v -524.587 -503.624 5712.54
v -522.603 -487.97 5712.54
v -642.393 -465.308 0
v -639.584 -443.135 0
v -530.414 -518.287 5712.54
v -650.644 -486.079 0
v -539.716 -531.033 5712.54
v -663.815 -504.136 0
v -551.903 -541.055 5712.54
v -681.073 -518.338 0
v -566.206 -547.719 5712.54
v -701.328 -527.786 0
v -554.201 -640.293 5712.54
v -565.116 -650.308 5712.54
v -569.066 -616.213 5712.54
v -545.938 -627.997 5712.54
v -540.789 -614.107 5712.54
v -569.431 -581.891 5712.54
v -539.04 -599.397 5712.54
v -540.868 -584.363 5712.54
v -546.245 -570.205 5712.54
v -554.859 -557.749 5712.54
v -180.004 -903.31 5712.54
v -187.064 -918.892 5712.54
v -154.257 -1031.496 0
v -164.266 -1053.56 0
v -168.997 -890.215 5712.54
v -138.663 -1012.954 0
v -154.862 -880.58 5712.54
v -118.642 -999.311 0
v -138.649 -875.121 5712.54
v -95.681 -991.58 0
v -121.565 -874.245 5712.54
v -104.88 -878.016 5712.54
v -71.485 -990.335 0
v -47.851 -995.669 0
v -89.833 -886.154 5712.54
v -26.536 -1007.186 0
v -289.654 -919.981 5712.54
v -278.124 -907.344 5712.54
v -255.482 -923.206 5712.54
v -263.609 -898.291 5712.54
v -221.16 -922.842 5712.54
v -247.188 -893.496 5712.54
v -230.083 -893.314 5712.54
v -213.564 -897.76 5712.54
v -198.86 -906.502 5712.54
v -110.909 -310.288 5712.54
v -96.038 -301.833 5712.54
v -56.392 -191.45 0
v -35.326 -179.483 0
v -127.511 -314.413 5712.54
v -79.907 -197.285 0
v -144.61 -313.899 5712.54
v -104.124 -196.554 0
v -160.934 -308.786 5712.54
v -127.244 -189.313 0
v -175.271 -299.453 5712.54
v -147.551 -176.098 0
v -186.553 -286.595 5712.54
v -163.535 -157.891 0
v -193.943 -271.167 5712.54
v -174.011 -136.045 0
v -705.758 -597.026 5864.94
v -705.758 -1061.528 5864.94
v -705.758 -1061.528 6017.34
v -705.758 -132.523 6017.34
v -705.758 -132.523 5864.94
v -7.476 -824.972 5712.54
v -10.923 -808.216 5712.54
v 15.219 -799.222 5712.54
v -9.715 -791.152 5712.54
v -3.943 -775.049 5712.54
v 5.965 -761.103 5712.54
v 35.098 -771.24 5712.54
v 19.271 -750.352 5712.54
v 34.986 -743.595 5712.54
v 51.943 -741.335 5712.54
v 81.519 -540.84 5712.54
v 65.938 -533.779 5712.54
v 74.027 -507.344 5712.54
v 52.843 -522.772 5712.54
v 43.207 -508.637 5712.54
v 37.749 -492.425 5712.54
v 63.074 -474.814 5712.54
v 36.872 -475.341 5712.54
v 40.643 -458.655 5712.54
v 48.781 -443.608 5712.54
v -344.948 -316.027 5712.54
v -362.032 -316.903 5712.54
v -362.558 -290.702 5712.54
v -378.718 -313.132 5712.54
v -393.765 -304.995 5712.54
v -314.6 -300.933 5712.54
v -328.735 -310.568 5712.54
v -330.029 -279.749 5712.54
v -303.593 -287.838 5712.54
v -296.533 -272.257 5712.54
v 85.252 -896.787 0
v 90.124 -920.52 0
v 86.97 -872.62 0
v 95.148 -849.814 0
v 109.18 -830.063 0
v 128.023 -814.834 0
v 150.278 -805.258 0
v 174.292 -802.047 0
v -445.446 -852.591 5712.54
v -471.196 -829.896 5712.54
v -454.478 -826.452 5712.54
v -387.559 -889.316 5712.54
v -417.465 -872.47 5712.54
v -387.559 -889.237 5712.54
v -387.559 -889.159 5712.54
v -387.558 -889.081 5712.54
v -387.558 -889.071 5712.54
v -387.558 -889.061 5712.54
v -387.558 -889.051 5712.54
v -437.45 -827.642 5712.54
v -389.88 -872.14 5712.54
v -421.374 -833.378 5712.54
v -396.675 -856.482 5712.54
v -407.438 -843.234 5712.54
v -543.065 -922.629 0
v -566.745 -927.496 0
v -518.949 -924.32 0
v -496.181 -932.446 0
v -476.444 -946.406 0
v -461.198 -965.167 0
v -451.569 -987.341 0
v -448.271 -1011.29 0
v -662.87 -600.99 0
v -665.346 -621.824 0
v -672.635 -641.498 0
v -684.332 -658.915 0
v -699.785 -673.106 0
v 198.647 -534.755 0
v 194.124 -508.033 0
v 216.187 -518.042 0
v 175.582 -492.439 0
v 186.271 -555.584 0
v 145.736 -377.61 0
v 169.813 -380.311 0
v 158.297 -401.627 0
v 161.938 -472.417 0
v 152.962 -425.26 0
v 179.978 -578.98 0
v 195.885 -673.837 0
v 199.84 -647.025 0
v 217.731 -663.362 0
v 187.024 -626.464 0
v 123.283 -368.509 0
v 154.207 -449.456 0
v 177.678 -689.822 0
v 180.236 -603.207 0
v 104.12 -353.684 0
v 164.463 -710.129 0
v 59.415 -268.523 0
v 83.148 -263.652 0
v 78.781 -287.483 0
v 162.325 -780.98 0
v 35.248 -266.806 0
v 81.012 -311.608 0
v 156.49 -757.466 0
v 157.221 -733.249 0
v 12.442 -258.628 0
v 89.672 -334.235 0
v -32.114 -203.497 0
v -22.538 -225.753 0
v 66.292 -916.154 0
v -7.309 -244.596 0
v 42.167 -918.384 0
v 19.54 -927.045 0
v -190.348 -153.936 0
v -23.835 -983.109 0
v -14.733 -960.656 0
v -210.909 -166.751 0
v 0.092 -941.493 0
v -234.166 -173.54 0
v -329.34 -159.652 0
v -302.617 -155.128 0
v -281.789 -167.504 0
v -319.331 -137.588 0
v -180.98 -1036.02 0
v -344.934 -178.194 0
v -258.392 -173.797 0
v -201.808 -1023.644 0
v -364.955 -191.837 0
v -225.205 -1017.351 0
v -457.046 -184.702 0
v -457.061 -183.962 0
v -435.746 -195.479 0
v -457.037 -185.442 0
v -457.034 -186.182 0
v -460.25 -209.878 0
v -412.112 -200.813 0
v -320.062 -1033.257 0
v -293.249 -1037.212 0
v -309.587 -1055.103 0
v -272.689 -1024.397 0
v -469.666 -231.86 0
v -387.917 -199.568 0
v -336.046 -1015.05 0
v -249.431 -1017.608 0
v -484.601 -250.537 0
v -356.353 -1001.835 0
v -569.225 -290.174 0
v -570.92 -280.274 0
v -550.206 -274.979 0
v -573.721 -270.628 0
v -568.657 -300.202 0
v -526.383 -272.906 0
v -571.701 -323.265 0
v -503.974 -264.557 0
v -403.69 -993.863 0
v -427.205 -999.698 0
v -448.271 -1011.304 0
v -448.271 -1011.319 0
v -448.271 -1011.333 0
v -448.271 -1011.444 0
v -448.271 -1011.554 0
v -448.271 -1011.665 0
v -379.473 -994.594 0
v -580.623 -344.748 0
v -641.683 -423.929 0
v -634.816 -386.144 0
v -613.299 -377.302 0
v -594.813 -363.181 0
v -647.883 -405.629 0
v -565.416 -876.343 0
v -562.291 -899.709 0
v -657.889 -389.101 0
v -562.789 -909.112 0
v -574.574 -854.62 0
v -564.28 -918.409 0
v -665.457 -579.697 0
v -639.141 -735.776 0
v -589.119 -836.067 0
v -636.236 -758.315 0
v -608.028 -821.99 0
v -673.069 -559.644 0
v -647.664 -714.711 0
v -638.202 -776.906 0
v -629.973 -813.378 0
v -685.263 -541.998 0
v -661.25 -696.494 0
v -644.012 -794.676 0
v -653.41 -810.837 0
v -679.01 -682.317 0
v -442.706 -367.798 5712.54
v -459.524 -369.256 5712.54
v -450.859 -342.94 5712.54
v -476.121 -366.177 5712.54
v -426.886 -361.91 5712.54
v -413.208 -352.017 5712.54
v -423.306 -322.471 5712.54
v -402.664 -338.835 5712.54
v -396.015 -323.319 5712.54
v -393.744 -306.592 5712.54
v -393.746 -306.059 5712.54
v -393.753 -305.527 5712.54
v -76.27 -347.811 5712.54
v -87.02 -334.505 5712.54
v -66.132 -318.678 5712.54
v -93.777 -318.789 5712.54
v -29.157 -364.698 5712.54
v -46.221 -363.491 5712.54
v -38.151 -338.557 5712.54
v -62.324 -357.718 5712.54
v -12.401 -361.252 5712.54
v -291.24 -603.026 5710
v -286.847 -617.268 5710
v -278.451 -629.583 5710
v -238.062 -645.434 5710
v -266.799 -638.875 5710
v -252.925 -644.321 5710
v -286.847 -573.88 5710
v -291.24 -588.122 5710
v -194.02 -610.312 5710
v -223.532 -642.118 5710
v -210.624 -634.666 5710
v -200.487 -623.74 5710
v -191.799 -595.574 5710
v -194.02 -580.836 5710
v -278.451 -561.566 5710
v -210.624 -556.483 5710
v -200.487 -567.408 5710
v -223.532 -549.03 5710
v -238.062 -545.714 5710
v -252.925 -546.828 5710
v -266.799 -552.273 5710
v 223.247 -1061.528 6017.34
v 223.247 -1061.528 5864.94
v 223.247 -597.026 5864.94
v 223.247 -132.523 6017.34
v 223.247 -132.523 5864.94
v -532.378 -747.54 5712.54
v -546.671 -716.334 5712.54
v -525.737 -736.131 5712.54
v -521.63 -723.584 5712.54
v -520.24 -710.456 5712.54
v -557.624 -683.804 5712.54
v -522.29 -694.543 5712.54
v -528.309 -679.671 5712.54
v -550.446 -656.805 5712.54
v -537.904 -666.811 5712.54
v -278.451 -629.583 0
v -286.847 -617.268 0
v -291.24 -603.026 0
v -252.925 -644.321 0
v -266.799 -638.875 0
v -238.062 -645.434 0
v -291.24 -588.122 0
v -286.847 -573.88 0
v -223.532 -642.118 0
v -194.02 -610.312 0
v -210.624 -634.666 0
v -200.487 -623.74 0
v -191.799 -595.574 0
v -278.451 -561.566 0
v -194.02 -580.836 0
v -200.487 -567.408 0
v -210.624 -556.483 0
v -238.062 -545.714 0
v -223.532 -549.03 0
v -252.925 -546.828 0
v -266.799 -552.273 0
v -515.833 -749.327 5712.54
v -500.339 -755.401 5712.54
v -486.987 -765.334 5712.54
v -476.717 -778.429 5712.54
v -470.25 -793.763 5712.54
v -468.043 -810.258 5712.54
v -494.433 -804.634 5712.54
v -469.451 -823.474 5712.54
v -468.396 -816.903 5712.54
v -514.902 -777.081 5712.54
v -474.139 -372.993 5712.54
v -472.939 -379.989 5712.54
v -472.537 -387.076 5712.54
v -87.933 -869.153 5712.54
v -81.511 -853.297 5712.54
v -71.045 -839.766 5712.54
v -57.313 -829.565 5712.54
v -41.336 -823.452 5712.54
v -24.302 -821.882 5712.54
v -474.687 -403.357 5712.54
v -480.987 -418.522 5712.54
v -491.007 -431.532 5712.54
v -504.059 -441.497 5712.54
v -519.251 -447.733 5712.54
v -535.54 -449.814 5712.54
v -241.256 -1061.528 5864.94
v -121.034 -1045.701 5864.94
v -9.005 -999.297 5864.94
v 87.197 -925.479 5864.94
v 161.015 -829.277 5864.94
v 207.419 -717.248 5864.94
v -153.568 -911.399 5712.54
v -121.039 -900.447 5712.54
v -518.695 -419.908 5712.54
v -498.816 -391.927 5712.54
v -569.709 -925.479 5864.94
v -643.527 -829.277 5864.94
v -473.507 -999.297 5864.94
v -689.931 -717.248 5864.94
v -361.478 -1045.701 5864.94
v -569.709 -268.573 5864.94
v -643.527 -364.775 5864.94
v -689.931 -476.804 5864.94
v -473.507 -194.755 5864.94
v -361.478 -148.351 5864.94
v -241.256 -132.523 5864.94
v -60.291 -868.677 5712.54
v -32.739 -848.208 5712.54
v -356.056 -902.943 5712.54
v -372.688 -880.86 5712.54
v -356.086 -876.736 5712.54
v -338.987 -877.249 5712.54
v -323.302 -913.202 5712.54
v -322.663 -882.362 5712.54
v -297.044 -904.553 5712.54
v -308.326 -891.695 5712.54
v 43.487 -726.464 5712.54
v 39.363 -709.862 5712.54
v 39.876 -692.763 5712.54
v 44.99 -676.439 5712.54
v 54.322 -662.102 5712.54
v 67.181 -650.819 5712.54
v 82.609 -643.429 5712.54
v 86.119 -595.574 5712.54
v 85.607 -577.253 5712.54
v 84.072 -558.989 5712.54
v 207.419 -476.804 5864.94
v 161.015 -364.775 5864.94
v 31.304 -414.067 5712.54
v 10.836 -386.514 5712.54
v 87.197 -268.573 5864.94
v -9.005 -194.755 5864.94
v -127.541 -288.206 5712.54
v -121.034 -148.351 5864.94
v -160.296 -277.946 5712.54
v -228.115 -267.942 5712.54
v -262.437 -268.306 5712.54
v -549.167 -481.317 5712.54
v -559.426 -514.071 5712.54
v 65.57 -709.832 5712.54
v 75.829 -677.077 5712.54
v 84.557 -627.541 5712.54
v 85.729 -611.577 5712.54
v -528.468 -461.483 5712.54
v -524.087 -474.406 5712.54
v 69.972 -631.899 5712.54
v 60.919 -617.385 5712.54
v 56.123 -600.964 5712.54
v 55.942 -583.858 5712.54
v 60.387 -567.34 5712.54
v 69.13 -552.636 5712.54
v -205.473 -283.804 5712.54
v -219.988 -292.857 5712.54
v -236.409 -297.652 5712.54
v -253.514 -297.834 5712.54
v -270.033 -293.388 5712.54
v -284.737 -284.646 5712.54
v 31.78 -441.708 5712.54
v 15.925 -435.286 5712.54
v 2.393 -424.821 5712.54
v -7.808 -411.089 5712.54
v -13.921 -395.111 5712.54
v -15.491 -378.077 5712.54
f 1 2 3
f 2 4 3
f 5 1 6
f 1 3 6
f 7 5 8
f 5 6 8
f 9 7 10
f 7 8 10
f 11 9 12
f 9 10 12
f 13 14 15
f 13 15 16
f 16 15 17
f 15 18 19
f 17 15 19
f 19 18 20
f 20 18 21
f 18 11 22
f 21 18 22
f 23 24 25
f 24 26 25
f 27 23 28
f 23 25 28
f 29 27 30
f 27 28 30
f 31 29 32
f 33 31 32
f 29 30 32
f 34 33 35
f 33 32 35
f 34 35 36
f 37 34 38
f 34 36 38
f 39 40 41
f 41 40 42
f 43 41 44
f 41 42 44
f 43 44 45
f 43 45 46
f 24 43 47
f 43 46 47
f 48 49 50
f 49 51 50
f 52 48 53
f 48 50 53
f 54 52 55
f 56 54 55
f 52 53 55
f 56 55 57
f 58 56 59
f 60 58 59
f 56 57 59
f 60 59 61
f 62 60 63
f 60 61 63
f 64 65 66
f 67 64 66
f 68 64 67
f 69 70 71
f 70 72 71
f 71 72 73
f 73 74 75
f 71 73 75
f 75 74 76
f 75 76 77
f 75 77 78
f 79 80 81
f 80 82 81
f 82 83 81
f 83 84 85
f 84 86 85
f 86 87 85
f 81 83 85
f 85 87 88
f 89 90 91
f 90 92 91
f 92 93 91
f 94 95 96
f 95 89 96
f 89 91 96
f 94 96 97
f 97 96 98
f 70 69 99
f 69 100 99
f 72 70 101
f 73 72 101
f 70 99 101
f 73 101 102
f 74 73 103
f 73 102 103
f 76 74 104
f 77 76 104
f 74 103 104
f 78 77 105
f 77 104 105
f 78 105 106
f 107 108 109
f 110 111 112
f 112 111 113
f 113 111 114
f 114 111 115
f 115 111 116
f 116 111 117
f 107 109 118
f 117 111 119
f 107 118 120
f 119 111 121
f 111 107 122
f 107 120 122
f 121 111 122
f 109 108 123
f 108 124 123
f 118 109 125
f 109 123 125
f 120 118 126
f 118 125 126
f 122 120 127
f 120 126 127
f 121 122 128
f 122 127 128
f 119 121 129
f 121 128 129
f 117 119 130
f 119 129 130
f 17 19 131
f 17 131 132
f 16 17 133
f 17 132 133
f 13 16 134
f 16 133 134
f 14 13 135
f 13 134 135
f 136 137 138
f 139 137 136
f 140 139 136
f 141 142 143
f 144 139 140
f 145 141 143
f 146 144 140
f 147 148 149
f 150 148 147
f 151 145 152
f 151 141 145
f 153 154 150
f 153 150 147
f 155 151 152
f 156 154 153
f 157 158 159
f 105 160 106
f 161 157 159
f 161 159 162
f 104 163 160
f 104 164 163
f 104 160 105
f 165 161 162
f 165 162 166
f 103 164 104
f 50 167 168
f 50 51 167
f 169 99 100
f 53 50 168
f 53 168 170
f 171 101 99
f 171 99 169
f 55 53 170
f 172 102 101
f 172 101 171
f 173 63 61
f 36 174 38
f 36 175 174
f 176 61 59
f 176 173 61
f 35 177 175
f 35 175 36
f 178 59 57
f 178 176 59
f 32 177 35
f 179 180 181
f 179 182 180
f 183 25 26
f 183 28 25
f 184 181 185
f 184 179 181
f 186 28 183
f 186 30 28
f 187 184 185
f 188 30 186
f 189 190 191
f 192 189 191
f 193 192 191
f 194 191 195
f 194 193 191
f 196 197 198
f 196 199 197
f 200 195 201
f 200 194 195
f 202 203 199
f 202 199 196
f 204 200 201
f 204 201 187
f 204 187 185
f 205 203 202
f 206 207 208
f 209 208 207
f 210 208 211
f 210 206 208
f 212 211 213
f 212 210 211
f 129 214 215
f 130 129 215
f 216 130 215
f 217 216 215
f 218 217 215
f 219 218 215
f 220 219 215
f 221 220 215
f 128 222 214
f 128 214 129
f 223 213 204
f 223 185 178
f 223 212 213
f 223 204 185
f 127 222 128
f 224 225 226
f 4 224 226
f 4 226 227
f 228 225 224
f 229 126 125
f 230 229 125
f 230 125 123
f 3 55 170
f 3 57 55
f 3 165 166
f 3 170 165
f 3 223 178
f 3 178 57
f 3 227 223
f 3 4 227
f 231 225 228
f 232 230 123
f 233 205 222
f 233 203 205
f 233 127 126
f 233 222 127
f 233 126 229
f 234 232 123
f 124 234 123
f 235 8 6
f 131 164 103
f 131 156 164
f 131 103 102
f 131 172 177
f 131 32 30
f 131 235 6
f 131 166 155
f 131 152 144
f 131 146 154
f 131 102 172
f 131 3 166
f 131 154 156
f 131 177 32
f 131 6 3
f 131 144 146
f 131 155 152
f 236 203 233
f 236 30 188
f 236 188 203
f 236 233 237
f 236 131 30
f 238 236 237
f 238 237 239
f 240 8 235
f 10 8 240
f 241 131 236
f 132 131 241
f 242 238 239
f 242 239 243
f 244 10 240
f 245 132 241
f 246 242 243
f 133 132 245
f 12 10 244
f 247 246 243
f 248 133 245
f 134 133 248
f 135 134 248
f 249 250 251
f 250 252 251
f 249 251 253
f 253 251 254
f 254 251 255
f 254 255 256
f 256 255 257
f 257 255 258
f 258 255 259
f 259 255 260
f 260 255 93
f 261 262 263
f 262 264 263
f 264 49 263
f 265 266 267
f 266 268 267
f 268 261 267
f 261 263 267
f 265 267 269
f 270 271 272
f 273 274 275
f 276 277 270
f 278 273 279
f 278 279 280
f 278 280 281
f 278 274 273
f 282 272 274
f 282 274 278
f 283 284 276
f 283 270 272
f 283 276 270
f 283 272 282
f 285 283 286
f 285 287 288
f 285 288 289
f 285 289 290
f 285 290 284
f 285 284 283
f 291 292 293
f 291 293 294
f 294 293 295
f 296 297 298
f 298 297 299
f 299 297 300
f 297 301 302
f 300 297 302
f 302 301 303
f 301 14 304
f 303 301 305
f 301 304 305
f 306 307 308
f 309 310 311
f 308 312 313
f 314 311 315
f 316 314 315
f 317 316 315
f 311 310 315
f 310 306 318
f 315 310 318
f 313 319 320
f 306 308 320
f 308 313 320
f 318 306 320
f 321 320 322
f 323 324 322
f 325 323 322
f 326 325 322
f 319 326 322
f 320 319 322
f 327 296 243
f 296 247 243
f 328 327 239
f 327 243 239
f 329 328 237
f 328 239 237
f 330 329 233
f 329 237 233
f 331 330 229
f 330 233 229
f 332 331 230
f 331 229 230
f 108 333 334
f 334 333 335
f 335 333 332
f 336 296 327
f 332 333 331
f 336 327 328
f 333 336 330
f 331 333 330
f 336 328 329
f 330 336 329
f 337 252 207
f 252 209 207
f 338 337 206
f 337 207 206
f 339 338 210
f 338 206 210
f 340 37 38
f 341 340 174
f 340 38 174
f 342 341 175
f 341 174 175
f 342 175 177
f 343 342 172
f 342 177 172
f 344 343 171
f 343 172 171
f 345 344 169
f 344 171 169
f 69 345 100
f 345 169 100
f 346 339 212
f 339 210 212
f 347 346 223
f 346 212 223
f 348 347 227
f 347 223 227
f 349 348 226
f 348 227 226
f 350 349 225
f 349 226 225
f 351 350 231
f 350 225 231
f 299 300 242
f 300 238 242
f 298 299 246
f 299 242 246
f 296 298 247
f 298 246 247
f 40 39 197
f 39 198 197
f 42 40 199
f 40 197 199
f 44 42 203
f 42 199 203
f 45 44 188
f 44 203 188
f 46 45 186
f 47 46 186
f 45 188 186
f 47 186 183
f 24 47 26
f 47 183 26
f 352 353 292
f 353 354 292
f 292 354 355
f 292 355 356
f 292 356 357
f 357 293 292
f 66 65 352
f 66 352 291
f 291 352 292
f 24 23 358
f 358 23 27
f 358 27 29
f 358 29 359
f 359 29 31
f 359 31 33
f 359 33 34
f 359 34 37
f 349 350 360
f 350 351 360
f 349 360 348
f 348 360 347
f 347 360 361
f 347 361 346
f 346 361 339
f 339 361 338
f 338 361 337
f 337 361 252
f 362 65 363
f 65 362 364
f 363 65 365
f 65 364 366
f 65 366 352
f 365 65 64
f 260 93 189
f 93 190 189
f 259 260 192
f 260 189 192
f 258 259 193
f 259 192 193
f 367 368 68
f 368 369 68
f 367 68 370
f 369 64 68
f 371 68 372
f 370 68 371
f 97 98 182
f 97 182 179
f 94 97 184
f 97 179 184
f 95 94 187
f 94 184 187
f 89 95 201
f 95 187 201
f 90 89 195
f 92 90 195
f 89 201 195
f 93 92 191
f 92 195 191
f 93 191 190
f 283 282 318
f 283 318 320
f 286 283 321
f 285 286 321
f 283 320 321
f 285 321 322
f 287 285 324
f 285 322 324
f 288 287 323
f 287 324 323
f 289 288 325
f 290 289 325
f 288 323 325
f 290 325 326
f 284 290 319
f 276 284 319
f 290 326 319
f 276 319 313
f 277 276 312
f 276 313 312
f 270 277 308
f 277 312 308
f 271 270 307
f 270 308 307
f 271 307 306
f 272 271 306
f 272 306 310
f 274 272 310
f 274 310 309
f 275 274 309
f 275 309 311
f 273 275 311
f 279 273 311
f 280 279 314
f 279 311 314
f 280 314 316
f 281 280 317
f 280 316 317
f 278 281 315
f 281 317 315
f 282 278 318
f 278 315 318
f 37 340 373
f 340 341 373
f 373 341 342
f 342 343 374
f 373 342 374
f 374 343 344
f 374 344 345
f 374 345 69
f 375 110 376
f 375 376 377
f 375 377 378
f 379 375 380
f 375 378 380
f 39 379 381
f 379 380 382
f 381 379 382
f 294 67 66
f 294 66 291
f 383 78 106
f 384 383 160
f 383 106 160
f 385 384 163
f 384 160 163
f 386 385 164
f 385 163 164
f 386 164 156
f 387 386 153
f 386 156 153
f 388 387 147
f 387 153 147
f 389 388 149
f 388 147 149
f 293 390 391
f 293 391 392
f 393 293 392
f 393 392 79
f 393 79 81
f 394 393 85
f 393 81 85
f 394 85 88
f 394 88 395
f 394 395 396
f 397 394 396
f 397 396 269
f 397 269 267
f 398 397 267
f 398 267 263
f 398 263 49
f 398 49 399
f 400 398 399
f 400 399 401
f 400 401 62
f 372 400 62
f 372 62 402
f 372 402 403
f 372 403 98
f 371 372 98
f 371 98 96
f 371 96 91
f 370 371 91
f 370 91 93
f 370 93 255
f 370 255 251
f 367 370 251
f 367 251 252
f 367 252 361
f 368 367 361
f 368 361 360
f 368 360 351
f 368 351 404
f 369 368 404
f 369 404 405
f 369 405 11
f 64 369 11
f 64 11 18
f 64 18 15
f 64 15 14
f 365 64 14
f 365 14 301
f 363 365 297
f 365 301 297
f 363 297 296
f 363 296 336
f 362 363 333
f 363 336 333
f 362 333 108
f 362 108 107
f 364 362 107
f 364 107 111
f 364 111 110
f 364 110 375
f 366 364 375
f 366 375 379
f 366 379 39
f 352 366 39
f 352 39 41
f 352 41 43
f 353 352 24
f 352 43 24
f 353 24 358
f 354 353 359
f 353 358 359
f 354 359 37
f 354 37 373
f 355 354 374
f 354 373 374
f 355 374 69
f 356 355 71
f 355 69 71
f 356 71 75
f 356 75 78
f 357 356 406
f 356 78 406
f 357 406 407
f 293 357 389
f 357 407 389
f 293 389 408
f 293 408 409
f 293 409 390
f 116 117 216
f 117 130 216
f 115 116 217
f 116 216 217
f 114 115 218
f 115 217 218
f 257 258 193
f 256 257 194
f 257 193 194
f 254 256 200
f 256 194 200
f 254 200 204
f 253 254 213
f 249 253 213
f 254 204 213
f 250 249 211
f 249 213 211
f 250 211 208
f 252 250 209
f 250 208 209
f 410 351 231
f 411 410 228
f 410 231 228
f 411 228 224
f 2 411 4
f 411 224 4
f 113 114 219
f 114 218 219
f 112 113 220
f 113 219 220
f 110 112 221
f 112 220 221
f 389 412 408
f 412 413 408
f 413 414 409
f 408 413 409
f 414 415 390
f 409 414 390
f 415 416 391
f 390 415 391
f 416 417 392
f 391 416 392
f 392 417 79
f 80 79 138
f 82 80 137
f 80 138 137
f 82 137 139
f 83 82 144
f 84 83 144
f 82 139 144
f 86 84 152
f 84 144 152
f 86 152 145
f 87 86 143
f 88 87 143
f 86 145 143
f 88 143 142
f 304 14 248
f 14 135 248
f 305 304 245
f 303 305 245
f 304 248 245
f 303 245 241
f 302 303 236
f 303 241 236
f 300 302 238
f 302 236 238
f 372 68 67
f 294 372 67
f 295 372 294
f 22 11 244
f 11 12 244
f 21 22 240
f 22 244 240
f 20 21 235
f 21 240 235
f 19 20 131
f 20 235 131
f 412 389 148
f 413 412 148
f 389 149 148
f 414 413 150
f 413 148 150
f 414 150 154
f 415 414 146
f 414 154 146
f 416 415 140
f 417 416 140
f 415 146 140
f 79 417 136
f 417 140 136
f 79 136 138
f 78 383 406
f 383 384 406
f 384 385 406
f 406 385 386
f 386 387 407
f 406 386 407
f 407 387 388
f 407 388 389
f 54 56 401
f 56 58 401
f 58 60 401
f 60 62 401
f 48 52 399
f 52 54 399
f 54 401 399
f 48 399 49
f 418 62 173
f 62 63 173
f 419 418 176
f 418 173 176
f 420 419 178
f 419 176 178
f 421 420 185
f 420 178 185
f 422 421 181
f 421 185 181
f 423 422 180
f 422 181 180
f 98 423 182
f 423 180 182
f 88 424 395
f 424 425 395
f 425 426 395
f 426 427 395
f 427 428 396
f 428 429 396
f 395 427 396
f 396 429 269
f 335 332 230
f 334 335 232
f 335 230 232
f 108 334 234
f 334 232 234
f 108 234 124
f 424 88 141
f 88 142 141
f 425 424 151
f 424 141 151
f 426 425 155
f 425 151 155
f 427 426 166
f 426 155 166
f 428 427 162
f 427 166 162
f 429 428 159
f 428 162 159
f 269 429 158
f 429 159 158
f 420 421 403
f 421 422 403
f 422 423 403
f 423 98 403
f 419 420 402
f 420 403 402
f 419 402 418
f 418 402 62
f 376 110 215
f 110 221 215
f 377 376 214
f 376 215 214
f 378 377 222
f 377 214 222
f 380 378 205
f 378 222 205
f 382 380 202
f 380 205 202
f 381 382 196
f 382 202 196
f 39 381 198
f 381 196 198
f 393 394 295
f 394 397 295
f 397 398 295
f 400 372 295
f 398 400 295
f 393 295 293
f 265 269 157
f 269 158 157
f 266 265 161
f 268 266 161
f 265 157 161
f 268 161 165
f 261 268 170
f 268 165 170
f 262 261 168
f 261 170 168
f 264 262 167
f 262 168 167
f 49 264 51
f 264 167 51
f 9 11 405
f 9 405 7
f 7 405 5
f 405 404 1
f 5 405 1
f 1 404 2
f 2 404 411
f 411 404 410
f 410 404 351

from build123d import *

# Parameters (mm, degrees)
F1_R      = 50
F2_DEPTH  = 5710
F8_R      = 464.5025
F6_R      = 327.9178677151
F10_W     = 929.005
F10_H     = 929.005
F11_DEPTH = 152.4


with BuildPart() as f2:
    # F1 (on face) → F2 (new body)
    with BuildSketch(Plane.XY):
        with Locations((-241.7985647917, -595.5741405487)):
            Circle(F1_R)
    extrude(amount=F2_DEPTH)


with BuildPart() as f5:
    # F4 (on offset) → F5 section 0
    with BuildSketch(Plane.XY.offset(5712.54)):
        with BuildLine():
            ThreePointArc((82.6085809515, -643.4294616488), (55.4466731348, -592.4173741574), (81.5190725913, -540.8399343891))
            ThreePointArc((81.5190725913, -540.8399343891), (39.9229612138, -500.7180472855), (48.7809811976, -443.6081725838))
            ThreePointArc((48.7809811976, -443.6081725838), (-3.1776165419, -418.3038957235), (-12.4010607443, -361.2518985322))
            ThreePointArc((-12.4010607443, -361.2518985322), (-69.6360752822, -353.2421908394), (-96.0381286887, -301.8327181482))
            ThreePointArc((-96.0381286887, -301.8327181482), (-152.9469980223, -311.9016256189), (-193.9432436916, -271.1669948055))
            ThreePointArc((-193.9432436916, -271.1669948055), (-244.955331183, -298.3289026223), (-296.5327709513, -272.2565031657))
            ThreePointArc((-296.5327709513, -272.2565031657), (-336.6546580548, -313.8526145432), (-393.7645327565, -304.9945945594))
            ThreePointArc((-393.7645327565, -304.9945945594), (-393.7492868459, -305.7930100504), (-393.7442046012, -306.5915549174))
            ThreePointArc((-393.7442046012, -306.5915549174), (-419.7128558258, -357.4253196278), (-476.1208068082, -366.1766365013))
            ThreePointArc((-476.1208068082, -366.1766365013), (-473.4397179136, -376.4739586196), (-472.537369413, -387.0762625037))
            ThreePointArc((-472.537369413, -387.0762625037), (-491.0065595478, -431.5321858111), (-535.5399871922, -449.8137044457))
            ThreePointArc((-535.5399871922, -449.8137044457), (-525.9251935326, -467.8251960906), (-522.6029798153, -487.9701950831))
            ThreePointArc((-522.6029798153, -487.9701950831), (-534.6627538789, -524.953624615), (-566.2057105349, -547.7188194486))
            ThreePointArc((-566.2057105349, -547.7188194486), (-546.2453578162, -570.2054941972), (-539.0402650343, -599.3971515655))
            ThreePointArc((-539.0402650343, -599.3971515655), (-545.9384891407, -627.9974325458), (-565.1162021747, -650.3083467084))
            ThreePointArc((-565.1162021747, -650.3083467083), (-532.6956053929, -672.930364835), (-520.2402290675, -710.449885093))
            ThreePointArc((-520.2402290675, -710.449885093), (-523.3518638208, -729.9627836852), (-532.378110781, -747.5401085136))
            ThreePointArc((-532.378110781, -747.5401085136), (-486.9869353651, -765.3342523192), (-468.0431504229, -810.2577803582))
            ThreePointArc((-468.0431504229, -810.2577803582), (-468.8363948241, -820.2028242393), (-471.1960688391, -829.8963825652))
            ThreePointArc((-471.1960688391, -829.8963825652), (-414.0689953151, -837.8295757031), (-387.5584428367, -889.05094517))
            ThreePointArc((-387.5584428367, -889.05094517), (-387.5585823513, -889.1832543539), (-387.5590008947, -889.3155629493))
            ThreePointArc((-387.5590008947, -889.3155629493), (-330.6501315611, -879.2466554785), (-289.6538858918, -919.9812862919))
            ThreePointArc((-289.6538858918, -919.9812862919), (-238.6417984004, -892.8193784752), (-187.064358632, -918.8917779317))
            ThreePointArc((-187.064358632, -918.8917779317), (-146.9424715285, -877.2956665542), (-89.8325968268, -886.153686538))
            ThreePointArc((-89.8325968268, -886.153686538), (-64.5283199665, -834.1950887985), (-7.4763227751, -824.9716445961))
            ThreePointArc((-7.4763227751, -824.9716445961), (0.5333849176, -767.7366300582), (51.9428576089, -741.3345766517))
            ThreePointArc((51.9428576089, -741.3345766517), (41.8739501382, -684.4257073181), (82.6085809515, -643.4294616488))
        make_face()
    # F0 (on Top) → F5 section 1
    with BuildSketch(Plane.XY):
        with BuildLine():
            ThreePointArc((217.7307352444, -663.3621136576), (179.277690131, -591.1022200019), (216.1874245599, -518.0419680587))
            ThreePointArc((216.1874245599, -518.0419680587), (157.2868702821, -461.2013697562), (169.8132542617, -380.3112058671))
            ThreePointArc((169.8132542617, -380.3112058671), (96.2307874564, -344.4538567113), (83.1476512463, -263.6518737126))
            ThreePointArc((83.1476512463, -263.6518737126), (2.0860364438, -252.2877408718), (-35.3259514283, -179.4833998399))
            ThreePointArc((-35.3259514283, -179.4833998399), (-115.9318385818, -193.7248838151), (-174.0105320782, -136.044780908))
            ThreePointArc((-174.0105320782, -136.044780908), (-246.2704257338, -174.4978260214), (-319.330677677, -137.5880915925))
            ThreePointArc((-319.330677677, -137.5880915925), (-376.1712759795, -196.4886458703), (-457.0614398687, -183.9622618907))
            ThreePointArc((-457.0614398687, -183.9622618907), (-457.0406511287, -185.0720867353), (-457.0337211885, -186.1820846331))
            ThreePointArc((-457.0337211885, -186.1820846331), (-493.8139496004, -258.2011057983), (-573.7207720232, -270.6278649061))
            ThreePointArc((-573.7207720232, -270.6278649061), (-569.932364408, -285.1998152046), (-568.6573713385, -300.2020870469))
            ThreePointArc((-568.6573713385, -300.2020870469), (-594.8130235777, -363.1811059665), (-657.8892458958, -389.1014675807))
            ThreePointArc((-657.8892458958, -389.1014675807), (-644.284327422, -414.6100181367), (-639.5836527418, -443.1351582011))
            ThreePointArc((-639.5836527418, -443.1351582011), (-656.6597028867, -495.5234224139), (-701.3278648277, -527.7860482305))
            ThreePointArc((-701.3278648278, -527.7860482305), (-673.0694299239, -559.6443885492), (-662.8698068021, -600.9900132178))
            ThreePointArc((-662.8698068021, -600.9900132178), (-672.6347988683, -641.4975497921), (-699.7845541433, -673.1061938294))
            ThreePointArc((-699.7845541433, -673.1061938294), (-653.8728585496, -705.1666762733), (-636.2364225158, -758.3147190485))
            ThreePointArc((-636.2364225158, -758.3147190485), (-640.6389230326, -785.9440979971), (-653.410383845, -810.8369560211))
            ThreePointArc((-653.410383845, -810.8369560211), (-589.1185555035, -836.0674576604), (-562.2905611026, -899.7092373409))
            ThreePointArc((-562.2905611026, -899.7092373409), (-563.4111789384, -913.7801316574), (-566.7447808297, -927.4962881755))
            ThreePointArc((-566.7447808297, -927.4962881755), (-485.8185302397, -938.7644427359), (-448.2705586888, -1011.3328874909))
            ThreePointArc((-448.2705586888, -1011.3328874909), (-448.2707135555, -1011.4988250586), (-448.2711781551, -1011.6647620482))
            ThreePointArc((-448.2711781551, -1011.6647620482), (-367.6652910016, -997.423278073), (-309.5865975052, -1055.1033809801))
            ThreePointArc((-309.5865975052, -1055.1033809801), (-237.3267038496, -1016.6503358667), (-164.2664519063, -1053.5600702956))
            ThreePointArc((-164.2664519063, -1053.5600702956), (-107.4258536038, -994.6595160178), (-26.5356897147, -1007.1858999974))
            ThreePointArc((-26.5356897147, -1007.1858999974), (9.3216594411, -933.6034331922), (90.1236424398, -920.520296982))
            ThreePointArc((90.1236424398, -920.520296982), (101.4877752806, -839.4586821795), (174.2921163125, -802.0466943075))
            ThreePointArc((174.2921163125, -802.0466943075), (160.0506323373, -721.440807154), (217.7307352444, -663.3621136576))
        make_face()
    loft()

    # F8 (on offset) → F9 section 0
    with BuildSketch(Plane.XY.offset(5864.94)):
        with Locations((-241.2558197975, -597.0259308815)):
            Circle(F8_R)
    # F6 (on offset) → F9 section 1
    with BuildSketch(Plane.XY.offset(5712.54)):
        with Locations((-241.7985647917, -595.5741405487)):
            Circle(F6_R)
    loft()

    # F10 (on offset) → F11 (join)
    with BuildSketch(Plane.XY.offset(5864.94)):
        with Locations((-241.2558197975, -597.0259308815)):
            Rectangle(F10_W, F10_H)
    extrude(amount=F11_DEPTH)


solid = Compound([f2.part, f5.part])
